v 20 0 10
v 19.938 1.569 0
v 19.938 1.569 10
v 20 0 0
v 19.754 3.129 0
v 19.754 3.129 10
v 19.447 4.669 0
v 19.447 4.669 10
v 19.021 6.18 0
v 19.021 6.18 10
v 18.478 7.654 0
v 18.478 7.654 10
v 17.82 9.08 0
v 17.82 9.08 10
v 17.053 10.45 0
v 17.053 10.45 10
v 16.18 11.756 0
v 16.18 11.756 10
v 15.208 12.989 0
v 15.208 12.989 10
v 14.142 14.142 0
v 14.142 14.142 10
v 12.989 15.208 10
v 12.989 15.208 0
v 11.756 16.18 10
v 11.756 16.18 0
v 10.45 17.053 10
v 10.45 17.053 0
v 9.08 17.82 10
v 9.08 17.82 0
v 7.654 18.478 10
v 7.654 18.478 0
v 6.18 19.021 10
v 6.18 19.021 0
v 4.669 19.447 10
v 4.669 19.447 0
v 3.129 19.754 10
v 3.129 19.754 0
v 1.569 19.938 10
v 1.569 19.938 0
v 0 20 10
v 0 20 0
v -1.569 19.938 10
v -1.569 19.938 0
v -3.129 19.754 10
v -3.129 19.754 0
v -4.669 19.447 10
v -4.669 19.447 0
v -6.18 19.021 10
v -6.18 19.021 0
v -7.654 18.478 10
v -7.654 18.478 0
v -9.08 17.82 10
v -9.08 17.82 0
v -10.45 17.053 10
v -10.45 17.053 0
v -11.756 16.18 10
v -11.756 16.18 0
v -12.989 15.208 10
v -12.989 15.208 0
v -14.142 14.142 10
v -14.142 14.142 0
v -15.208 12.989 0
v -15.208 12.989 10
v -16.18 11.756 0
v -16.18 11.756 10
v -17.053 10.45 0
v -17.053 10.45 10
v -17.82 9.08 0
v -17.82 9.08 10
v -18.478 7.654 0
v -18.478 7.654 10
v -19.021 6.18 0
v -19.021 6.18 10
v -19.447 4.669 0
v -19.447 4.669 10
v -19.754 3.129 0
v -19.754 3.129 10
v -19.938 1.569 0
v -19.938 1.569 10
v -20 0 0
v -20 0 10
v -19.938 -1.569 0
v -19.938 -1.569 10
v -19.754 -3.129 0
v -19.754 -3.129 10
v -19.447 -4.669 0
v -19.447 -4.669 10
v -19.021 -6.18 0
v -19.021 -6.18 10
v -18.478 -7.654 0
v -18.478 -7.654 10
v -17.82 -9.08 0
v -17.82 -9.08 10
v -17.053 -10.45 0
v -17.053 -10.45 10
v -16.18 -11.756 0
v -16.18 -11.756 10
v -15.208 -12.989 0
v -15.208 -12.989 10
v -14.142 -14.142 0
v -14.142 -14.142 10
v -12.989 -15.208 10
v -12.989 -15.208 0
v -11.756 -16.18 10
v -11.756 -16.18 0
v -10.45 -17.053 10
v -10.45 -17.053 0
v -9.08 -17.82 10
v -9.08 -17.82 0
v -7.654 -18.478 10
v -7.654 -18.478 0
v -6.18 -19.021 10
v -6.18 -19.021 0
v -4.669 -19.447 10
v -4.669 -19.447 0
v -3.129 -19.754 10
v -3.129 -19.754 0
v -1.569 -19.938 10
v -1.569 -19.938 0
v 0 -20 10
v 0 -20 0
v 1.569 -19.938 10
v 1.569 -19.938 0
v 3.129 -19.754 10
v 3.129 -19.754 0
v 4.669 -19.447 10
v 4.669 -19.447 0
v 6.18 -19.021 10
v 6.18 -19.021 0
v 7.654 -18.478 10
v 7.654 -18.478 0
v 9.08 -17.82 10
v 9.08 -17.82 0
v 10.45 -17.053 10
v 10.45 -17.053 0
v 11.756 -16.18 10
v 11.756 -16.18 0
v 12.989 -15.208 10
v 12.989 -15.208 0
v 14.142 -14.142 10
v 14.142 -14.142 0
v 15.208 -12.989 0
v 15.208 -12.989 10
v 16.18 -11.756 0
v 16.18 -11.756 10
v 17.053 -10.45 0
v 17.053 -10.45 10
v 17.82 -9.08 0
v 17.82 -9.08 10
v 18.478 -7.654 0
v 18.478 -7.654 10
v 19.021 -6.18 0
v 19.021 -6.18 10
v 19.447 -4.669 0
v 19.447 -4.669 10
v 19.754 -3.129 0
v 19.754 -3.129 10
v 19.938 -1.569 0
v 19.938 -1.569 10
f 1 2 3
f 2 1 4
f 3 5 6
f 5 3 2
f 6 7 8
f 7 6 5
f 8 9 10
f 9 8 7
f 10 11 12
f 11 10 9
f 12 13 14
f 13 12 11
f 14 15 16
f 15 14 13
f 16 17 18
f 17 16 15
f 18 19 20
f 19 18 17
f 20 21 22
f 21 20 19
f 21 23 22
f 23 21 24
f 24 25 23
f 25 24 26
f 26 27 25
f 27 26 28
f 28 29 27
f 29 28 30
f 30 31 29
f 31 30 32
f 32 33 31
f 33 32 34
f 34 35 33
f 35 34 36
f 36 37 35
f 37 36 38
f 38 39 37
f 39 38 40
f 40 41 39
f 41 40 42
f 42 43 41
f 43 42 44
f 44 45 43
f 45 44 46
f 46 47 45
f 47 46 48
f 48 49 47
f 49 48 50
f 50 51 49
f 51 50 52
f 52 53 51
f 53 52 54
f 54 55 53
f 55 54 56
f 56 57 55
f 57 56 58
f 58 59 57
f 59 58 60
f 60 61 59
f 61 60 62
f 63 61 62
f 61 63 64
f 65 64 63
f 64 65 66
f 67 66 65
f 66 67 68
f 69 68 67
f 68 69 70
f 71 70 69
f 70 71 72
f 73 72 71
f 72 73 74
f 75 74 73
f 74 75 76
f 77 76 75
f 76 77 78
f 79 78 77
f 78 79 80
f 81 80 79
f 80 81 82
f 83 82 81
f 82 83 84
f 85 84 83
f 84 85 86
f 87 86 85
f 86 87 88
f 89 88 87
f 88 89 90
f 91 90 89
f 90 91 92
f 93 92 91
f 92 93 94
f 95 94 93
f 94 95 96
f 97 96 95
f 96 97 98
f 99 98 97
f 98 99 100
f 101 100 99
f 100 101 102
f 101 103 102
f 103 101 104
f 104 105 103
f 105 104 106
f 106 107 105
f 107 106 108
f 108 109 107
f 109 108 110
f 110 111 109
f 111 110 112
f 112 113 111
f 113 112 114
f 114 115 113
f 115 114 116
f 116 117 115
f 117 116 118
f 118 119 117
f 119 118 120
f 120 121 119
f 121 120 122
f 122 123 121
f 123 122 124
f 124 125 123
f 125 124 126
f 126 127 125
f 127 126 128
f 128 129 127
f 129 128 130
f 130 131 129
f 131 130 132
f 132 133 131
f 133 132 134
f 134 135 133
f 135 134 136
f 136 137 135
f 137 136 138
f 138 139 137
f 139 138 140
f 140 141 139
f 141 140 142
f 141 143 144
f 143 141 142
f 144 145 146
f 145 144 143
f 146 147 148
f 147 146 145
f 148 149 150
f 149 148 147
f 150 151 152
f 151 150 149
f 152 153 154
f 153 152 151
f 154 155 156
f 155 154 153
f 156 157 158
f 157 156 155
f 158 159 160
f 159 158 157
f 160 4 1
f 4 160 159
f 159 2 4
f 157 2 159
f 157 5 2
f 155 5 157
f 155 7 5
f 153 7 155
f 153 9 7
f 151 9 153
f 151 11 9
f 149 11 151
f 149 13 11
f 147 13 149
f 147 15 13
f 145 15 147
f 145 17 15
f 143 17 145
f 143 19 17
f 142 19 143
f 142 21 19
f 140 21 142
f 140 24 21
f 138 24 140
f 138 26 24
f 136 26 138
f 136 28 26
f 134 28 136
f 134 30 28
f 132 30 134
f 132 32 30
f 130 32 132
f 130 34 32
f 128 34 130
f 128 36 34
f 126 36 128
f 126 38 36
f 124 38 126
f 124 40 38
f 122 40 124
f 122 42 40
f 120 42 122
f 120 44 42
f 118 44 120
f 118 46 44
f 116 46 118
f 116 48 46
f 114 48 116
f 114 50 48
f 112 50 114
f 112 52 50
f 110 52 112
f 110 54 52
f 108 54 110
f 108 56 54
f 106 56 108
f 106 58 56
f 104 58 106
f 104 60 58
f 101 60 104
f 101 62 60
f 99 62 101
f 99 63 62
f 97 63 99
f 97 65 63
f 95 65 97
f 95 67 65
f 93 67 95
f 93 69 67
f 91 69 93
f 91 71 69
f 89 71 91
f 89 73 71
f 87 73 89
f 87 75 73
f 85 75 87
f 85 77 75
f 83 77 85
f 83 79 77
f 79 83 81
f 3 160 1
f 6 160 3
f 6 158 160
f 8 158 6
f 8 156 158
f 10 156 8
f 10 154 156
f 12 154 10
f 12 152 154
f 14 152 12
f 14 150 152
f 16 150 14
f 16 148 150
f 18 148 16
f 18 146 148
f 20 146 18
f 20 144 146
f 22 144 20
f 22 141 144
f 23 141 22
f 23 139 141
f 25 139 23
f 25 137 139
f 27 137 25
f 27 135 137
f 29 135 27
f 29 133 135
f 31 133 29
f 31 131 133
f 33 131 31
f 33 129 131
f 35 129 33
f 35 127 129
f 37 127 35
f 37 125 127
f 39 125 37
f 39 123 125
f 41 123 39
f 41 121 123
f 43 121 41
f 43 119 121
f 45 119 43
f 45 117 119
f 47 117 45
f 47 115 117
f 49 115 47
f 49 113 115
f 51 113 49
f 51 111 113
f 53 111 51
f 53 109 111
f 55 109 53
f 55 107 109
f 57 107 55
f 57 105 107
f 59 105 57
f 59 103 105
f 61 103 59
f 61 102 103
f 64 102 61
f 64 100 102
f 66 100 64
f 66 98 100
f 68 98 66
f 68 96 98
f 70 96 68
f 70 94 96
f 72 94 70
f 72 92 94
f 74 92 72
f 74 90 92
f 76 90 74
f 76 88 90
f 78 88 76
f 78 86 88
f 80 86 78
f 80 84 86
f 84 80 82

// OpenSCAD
 sides = 80;
 $fn = sides;
 
 
 height = 10;
cylinder(height,20,20);
